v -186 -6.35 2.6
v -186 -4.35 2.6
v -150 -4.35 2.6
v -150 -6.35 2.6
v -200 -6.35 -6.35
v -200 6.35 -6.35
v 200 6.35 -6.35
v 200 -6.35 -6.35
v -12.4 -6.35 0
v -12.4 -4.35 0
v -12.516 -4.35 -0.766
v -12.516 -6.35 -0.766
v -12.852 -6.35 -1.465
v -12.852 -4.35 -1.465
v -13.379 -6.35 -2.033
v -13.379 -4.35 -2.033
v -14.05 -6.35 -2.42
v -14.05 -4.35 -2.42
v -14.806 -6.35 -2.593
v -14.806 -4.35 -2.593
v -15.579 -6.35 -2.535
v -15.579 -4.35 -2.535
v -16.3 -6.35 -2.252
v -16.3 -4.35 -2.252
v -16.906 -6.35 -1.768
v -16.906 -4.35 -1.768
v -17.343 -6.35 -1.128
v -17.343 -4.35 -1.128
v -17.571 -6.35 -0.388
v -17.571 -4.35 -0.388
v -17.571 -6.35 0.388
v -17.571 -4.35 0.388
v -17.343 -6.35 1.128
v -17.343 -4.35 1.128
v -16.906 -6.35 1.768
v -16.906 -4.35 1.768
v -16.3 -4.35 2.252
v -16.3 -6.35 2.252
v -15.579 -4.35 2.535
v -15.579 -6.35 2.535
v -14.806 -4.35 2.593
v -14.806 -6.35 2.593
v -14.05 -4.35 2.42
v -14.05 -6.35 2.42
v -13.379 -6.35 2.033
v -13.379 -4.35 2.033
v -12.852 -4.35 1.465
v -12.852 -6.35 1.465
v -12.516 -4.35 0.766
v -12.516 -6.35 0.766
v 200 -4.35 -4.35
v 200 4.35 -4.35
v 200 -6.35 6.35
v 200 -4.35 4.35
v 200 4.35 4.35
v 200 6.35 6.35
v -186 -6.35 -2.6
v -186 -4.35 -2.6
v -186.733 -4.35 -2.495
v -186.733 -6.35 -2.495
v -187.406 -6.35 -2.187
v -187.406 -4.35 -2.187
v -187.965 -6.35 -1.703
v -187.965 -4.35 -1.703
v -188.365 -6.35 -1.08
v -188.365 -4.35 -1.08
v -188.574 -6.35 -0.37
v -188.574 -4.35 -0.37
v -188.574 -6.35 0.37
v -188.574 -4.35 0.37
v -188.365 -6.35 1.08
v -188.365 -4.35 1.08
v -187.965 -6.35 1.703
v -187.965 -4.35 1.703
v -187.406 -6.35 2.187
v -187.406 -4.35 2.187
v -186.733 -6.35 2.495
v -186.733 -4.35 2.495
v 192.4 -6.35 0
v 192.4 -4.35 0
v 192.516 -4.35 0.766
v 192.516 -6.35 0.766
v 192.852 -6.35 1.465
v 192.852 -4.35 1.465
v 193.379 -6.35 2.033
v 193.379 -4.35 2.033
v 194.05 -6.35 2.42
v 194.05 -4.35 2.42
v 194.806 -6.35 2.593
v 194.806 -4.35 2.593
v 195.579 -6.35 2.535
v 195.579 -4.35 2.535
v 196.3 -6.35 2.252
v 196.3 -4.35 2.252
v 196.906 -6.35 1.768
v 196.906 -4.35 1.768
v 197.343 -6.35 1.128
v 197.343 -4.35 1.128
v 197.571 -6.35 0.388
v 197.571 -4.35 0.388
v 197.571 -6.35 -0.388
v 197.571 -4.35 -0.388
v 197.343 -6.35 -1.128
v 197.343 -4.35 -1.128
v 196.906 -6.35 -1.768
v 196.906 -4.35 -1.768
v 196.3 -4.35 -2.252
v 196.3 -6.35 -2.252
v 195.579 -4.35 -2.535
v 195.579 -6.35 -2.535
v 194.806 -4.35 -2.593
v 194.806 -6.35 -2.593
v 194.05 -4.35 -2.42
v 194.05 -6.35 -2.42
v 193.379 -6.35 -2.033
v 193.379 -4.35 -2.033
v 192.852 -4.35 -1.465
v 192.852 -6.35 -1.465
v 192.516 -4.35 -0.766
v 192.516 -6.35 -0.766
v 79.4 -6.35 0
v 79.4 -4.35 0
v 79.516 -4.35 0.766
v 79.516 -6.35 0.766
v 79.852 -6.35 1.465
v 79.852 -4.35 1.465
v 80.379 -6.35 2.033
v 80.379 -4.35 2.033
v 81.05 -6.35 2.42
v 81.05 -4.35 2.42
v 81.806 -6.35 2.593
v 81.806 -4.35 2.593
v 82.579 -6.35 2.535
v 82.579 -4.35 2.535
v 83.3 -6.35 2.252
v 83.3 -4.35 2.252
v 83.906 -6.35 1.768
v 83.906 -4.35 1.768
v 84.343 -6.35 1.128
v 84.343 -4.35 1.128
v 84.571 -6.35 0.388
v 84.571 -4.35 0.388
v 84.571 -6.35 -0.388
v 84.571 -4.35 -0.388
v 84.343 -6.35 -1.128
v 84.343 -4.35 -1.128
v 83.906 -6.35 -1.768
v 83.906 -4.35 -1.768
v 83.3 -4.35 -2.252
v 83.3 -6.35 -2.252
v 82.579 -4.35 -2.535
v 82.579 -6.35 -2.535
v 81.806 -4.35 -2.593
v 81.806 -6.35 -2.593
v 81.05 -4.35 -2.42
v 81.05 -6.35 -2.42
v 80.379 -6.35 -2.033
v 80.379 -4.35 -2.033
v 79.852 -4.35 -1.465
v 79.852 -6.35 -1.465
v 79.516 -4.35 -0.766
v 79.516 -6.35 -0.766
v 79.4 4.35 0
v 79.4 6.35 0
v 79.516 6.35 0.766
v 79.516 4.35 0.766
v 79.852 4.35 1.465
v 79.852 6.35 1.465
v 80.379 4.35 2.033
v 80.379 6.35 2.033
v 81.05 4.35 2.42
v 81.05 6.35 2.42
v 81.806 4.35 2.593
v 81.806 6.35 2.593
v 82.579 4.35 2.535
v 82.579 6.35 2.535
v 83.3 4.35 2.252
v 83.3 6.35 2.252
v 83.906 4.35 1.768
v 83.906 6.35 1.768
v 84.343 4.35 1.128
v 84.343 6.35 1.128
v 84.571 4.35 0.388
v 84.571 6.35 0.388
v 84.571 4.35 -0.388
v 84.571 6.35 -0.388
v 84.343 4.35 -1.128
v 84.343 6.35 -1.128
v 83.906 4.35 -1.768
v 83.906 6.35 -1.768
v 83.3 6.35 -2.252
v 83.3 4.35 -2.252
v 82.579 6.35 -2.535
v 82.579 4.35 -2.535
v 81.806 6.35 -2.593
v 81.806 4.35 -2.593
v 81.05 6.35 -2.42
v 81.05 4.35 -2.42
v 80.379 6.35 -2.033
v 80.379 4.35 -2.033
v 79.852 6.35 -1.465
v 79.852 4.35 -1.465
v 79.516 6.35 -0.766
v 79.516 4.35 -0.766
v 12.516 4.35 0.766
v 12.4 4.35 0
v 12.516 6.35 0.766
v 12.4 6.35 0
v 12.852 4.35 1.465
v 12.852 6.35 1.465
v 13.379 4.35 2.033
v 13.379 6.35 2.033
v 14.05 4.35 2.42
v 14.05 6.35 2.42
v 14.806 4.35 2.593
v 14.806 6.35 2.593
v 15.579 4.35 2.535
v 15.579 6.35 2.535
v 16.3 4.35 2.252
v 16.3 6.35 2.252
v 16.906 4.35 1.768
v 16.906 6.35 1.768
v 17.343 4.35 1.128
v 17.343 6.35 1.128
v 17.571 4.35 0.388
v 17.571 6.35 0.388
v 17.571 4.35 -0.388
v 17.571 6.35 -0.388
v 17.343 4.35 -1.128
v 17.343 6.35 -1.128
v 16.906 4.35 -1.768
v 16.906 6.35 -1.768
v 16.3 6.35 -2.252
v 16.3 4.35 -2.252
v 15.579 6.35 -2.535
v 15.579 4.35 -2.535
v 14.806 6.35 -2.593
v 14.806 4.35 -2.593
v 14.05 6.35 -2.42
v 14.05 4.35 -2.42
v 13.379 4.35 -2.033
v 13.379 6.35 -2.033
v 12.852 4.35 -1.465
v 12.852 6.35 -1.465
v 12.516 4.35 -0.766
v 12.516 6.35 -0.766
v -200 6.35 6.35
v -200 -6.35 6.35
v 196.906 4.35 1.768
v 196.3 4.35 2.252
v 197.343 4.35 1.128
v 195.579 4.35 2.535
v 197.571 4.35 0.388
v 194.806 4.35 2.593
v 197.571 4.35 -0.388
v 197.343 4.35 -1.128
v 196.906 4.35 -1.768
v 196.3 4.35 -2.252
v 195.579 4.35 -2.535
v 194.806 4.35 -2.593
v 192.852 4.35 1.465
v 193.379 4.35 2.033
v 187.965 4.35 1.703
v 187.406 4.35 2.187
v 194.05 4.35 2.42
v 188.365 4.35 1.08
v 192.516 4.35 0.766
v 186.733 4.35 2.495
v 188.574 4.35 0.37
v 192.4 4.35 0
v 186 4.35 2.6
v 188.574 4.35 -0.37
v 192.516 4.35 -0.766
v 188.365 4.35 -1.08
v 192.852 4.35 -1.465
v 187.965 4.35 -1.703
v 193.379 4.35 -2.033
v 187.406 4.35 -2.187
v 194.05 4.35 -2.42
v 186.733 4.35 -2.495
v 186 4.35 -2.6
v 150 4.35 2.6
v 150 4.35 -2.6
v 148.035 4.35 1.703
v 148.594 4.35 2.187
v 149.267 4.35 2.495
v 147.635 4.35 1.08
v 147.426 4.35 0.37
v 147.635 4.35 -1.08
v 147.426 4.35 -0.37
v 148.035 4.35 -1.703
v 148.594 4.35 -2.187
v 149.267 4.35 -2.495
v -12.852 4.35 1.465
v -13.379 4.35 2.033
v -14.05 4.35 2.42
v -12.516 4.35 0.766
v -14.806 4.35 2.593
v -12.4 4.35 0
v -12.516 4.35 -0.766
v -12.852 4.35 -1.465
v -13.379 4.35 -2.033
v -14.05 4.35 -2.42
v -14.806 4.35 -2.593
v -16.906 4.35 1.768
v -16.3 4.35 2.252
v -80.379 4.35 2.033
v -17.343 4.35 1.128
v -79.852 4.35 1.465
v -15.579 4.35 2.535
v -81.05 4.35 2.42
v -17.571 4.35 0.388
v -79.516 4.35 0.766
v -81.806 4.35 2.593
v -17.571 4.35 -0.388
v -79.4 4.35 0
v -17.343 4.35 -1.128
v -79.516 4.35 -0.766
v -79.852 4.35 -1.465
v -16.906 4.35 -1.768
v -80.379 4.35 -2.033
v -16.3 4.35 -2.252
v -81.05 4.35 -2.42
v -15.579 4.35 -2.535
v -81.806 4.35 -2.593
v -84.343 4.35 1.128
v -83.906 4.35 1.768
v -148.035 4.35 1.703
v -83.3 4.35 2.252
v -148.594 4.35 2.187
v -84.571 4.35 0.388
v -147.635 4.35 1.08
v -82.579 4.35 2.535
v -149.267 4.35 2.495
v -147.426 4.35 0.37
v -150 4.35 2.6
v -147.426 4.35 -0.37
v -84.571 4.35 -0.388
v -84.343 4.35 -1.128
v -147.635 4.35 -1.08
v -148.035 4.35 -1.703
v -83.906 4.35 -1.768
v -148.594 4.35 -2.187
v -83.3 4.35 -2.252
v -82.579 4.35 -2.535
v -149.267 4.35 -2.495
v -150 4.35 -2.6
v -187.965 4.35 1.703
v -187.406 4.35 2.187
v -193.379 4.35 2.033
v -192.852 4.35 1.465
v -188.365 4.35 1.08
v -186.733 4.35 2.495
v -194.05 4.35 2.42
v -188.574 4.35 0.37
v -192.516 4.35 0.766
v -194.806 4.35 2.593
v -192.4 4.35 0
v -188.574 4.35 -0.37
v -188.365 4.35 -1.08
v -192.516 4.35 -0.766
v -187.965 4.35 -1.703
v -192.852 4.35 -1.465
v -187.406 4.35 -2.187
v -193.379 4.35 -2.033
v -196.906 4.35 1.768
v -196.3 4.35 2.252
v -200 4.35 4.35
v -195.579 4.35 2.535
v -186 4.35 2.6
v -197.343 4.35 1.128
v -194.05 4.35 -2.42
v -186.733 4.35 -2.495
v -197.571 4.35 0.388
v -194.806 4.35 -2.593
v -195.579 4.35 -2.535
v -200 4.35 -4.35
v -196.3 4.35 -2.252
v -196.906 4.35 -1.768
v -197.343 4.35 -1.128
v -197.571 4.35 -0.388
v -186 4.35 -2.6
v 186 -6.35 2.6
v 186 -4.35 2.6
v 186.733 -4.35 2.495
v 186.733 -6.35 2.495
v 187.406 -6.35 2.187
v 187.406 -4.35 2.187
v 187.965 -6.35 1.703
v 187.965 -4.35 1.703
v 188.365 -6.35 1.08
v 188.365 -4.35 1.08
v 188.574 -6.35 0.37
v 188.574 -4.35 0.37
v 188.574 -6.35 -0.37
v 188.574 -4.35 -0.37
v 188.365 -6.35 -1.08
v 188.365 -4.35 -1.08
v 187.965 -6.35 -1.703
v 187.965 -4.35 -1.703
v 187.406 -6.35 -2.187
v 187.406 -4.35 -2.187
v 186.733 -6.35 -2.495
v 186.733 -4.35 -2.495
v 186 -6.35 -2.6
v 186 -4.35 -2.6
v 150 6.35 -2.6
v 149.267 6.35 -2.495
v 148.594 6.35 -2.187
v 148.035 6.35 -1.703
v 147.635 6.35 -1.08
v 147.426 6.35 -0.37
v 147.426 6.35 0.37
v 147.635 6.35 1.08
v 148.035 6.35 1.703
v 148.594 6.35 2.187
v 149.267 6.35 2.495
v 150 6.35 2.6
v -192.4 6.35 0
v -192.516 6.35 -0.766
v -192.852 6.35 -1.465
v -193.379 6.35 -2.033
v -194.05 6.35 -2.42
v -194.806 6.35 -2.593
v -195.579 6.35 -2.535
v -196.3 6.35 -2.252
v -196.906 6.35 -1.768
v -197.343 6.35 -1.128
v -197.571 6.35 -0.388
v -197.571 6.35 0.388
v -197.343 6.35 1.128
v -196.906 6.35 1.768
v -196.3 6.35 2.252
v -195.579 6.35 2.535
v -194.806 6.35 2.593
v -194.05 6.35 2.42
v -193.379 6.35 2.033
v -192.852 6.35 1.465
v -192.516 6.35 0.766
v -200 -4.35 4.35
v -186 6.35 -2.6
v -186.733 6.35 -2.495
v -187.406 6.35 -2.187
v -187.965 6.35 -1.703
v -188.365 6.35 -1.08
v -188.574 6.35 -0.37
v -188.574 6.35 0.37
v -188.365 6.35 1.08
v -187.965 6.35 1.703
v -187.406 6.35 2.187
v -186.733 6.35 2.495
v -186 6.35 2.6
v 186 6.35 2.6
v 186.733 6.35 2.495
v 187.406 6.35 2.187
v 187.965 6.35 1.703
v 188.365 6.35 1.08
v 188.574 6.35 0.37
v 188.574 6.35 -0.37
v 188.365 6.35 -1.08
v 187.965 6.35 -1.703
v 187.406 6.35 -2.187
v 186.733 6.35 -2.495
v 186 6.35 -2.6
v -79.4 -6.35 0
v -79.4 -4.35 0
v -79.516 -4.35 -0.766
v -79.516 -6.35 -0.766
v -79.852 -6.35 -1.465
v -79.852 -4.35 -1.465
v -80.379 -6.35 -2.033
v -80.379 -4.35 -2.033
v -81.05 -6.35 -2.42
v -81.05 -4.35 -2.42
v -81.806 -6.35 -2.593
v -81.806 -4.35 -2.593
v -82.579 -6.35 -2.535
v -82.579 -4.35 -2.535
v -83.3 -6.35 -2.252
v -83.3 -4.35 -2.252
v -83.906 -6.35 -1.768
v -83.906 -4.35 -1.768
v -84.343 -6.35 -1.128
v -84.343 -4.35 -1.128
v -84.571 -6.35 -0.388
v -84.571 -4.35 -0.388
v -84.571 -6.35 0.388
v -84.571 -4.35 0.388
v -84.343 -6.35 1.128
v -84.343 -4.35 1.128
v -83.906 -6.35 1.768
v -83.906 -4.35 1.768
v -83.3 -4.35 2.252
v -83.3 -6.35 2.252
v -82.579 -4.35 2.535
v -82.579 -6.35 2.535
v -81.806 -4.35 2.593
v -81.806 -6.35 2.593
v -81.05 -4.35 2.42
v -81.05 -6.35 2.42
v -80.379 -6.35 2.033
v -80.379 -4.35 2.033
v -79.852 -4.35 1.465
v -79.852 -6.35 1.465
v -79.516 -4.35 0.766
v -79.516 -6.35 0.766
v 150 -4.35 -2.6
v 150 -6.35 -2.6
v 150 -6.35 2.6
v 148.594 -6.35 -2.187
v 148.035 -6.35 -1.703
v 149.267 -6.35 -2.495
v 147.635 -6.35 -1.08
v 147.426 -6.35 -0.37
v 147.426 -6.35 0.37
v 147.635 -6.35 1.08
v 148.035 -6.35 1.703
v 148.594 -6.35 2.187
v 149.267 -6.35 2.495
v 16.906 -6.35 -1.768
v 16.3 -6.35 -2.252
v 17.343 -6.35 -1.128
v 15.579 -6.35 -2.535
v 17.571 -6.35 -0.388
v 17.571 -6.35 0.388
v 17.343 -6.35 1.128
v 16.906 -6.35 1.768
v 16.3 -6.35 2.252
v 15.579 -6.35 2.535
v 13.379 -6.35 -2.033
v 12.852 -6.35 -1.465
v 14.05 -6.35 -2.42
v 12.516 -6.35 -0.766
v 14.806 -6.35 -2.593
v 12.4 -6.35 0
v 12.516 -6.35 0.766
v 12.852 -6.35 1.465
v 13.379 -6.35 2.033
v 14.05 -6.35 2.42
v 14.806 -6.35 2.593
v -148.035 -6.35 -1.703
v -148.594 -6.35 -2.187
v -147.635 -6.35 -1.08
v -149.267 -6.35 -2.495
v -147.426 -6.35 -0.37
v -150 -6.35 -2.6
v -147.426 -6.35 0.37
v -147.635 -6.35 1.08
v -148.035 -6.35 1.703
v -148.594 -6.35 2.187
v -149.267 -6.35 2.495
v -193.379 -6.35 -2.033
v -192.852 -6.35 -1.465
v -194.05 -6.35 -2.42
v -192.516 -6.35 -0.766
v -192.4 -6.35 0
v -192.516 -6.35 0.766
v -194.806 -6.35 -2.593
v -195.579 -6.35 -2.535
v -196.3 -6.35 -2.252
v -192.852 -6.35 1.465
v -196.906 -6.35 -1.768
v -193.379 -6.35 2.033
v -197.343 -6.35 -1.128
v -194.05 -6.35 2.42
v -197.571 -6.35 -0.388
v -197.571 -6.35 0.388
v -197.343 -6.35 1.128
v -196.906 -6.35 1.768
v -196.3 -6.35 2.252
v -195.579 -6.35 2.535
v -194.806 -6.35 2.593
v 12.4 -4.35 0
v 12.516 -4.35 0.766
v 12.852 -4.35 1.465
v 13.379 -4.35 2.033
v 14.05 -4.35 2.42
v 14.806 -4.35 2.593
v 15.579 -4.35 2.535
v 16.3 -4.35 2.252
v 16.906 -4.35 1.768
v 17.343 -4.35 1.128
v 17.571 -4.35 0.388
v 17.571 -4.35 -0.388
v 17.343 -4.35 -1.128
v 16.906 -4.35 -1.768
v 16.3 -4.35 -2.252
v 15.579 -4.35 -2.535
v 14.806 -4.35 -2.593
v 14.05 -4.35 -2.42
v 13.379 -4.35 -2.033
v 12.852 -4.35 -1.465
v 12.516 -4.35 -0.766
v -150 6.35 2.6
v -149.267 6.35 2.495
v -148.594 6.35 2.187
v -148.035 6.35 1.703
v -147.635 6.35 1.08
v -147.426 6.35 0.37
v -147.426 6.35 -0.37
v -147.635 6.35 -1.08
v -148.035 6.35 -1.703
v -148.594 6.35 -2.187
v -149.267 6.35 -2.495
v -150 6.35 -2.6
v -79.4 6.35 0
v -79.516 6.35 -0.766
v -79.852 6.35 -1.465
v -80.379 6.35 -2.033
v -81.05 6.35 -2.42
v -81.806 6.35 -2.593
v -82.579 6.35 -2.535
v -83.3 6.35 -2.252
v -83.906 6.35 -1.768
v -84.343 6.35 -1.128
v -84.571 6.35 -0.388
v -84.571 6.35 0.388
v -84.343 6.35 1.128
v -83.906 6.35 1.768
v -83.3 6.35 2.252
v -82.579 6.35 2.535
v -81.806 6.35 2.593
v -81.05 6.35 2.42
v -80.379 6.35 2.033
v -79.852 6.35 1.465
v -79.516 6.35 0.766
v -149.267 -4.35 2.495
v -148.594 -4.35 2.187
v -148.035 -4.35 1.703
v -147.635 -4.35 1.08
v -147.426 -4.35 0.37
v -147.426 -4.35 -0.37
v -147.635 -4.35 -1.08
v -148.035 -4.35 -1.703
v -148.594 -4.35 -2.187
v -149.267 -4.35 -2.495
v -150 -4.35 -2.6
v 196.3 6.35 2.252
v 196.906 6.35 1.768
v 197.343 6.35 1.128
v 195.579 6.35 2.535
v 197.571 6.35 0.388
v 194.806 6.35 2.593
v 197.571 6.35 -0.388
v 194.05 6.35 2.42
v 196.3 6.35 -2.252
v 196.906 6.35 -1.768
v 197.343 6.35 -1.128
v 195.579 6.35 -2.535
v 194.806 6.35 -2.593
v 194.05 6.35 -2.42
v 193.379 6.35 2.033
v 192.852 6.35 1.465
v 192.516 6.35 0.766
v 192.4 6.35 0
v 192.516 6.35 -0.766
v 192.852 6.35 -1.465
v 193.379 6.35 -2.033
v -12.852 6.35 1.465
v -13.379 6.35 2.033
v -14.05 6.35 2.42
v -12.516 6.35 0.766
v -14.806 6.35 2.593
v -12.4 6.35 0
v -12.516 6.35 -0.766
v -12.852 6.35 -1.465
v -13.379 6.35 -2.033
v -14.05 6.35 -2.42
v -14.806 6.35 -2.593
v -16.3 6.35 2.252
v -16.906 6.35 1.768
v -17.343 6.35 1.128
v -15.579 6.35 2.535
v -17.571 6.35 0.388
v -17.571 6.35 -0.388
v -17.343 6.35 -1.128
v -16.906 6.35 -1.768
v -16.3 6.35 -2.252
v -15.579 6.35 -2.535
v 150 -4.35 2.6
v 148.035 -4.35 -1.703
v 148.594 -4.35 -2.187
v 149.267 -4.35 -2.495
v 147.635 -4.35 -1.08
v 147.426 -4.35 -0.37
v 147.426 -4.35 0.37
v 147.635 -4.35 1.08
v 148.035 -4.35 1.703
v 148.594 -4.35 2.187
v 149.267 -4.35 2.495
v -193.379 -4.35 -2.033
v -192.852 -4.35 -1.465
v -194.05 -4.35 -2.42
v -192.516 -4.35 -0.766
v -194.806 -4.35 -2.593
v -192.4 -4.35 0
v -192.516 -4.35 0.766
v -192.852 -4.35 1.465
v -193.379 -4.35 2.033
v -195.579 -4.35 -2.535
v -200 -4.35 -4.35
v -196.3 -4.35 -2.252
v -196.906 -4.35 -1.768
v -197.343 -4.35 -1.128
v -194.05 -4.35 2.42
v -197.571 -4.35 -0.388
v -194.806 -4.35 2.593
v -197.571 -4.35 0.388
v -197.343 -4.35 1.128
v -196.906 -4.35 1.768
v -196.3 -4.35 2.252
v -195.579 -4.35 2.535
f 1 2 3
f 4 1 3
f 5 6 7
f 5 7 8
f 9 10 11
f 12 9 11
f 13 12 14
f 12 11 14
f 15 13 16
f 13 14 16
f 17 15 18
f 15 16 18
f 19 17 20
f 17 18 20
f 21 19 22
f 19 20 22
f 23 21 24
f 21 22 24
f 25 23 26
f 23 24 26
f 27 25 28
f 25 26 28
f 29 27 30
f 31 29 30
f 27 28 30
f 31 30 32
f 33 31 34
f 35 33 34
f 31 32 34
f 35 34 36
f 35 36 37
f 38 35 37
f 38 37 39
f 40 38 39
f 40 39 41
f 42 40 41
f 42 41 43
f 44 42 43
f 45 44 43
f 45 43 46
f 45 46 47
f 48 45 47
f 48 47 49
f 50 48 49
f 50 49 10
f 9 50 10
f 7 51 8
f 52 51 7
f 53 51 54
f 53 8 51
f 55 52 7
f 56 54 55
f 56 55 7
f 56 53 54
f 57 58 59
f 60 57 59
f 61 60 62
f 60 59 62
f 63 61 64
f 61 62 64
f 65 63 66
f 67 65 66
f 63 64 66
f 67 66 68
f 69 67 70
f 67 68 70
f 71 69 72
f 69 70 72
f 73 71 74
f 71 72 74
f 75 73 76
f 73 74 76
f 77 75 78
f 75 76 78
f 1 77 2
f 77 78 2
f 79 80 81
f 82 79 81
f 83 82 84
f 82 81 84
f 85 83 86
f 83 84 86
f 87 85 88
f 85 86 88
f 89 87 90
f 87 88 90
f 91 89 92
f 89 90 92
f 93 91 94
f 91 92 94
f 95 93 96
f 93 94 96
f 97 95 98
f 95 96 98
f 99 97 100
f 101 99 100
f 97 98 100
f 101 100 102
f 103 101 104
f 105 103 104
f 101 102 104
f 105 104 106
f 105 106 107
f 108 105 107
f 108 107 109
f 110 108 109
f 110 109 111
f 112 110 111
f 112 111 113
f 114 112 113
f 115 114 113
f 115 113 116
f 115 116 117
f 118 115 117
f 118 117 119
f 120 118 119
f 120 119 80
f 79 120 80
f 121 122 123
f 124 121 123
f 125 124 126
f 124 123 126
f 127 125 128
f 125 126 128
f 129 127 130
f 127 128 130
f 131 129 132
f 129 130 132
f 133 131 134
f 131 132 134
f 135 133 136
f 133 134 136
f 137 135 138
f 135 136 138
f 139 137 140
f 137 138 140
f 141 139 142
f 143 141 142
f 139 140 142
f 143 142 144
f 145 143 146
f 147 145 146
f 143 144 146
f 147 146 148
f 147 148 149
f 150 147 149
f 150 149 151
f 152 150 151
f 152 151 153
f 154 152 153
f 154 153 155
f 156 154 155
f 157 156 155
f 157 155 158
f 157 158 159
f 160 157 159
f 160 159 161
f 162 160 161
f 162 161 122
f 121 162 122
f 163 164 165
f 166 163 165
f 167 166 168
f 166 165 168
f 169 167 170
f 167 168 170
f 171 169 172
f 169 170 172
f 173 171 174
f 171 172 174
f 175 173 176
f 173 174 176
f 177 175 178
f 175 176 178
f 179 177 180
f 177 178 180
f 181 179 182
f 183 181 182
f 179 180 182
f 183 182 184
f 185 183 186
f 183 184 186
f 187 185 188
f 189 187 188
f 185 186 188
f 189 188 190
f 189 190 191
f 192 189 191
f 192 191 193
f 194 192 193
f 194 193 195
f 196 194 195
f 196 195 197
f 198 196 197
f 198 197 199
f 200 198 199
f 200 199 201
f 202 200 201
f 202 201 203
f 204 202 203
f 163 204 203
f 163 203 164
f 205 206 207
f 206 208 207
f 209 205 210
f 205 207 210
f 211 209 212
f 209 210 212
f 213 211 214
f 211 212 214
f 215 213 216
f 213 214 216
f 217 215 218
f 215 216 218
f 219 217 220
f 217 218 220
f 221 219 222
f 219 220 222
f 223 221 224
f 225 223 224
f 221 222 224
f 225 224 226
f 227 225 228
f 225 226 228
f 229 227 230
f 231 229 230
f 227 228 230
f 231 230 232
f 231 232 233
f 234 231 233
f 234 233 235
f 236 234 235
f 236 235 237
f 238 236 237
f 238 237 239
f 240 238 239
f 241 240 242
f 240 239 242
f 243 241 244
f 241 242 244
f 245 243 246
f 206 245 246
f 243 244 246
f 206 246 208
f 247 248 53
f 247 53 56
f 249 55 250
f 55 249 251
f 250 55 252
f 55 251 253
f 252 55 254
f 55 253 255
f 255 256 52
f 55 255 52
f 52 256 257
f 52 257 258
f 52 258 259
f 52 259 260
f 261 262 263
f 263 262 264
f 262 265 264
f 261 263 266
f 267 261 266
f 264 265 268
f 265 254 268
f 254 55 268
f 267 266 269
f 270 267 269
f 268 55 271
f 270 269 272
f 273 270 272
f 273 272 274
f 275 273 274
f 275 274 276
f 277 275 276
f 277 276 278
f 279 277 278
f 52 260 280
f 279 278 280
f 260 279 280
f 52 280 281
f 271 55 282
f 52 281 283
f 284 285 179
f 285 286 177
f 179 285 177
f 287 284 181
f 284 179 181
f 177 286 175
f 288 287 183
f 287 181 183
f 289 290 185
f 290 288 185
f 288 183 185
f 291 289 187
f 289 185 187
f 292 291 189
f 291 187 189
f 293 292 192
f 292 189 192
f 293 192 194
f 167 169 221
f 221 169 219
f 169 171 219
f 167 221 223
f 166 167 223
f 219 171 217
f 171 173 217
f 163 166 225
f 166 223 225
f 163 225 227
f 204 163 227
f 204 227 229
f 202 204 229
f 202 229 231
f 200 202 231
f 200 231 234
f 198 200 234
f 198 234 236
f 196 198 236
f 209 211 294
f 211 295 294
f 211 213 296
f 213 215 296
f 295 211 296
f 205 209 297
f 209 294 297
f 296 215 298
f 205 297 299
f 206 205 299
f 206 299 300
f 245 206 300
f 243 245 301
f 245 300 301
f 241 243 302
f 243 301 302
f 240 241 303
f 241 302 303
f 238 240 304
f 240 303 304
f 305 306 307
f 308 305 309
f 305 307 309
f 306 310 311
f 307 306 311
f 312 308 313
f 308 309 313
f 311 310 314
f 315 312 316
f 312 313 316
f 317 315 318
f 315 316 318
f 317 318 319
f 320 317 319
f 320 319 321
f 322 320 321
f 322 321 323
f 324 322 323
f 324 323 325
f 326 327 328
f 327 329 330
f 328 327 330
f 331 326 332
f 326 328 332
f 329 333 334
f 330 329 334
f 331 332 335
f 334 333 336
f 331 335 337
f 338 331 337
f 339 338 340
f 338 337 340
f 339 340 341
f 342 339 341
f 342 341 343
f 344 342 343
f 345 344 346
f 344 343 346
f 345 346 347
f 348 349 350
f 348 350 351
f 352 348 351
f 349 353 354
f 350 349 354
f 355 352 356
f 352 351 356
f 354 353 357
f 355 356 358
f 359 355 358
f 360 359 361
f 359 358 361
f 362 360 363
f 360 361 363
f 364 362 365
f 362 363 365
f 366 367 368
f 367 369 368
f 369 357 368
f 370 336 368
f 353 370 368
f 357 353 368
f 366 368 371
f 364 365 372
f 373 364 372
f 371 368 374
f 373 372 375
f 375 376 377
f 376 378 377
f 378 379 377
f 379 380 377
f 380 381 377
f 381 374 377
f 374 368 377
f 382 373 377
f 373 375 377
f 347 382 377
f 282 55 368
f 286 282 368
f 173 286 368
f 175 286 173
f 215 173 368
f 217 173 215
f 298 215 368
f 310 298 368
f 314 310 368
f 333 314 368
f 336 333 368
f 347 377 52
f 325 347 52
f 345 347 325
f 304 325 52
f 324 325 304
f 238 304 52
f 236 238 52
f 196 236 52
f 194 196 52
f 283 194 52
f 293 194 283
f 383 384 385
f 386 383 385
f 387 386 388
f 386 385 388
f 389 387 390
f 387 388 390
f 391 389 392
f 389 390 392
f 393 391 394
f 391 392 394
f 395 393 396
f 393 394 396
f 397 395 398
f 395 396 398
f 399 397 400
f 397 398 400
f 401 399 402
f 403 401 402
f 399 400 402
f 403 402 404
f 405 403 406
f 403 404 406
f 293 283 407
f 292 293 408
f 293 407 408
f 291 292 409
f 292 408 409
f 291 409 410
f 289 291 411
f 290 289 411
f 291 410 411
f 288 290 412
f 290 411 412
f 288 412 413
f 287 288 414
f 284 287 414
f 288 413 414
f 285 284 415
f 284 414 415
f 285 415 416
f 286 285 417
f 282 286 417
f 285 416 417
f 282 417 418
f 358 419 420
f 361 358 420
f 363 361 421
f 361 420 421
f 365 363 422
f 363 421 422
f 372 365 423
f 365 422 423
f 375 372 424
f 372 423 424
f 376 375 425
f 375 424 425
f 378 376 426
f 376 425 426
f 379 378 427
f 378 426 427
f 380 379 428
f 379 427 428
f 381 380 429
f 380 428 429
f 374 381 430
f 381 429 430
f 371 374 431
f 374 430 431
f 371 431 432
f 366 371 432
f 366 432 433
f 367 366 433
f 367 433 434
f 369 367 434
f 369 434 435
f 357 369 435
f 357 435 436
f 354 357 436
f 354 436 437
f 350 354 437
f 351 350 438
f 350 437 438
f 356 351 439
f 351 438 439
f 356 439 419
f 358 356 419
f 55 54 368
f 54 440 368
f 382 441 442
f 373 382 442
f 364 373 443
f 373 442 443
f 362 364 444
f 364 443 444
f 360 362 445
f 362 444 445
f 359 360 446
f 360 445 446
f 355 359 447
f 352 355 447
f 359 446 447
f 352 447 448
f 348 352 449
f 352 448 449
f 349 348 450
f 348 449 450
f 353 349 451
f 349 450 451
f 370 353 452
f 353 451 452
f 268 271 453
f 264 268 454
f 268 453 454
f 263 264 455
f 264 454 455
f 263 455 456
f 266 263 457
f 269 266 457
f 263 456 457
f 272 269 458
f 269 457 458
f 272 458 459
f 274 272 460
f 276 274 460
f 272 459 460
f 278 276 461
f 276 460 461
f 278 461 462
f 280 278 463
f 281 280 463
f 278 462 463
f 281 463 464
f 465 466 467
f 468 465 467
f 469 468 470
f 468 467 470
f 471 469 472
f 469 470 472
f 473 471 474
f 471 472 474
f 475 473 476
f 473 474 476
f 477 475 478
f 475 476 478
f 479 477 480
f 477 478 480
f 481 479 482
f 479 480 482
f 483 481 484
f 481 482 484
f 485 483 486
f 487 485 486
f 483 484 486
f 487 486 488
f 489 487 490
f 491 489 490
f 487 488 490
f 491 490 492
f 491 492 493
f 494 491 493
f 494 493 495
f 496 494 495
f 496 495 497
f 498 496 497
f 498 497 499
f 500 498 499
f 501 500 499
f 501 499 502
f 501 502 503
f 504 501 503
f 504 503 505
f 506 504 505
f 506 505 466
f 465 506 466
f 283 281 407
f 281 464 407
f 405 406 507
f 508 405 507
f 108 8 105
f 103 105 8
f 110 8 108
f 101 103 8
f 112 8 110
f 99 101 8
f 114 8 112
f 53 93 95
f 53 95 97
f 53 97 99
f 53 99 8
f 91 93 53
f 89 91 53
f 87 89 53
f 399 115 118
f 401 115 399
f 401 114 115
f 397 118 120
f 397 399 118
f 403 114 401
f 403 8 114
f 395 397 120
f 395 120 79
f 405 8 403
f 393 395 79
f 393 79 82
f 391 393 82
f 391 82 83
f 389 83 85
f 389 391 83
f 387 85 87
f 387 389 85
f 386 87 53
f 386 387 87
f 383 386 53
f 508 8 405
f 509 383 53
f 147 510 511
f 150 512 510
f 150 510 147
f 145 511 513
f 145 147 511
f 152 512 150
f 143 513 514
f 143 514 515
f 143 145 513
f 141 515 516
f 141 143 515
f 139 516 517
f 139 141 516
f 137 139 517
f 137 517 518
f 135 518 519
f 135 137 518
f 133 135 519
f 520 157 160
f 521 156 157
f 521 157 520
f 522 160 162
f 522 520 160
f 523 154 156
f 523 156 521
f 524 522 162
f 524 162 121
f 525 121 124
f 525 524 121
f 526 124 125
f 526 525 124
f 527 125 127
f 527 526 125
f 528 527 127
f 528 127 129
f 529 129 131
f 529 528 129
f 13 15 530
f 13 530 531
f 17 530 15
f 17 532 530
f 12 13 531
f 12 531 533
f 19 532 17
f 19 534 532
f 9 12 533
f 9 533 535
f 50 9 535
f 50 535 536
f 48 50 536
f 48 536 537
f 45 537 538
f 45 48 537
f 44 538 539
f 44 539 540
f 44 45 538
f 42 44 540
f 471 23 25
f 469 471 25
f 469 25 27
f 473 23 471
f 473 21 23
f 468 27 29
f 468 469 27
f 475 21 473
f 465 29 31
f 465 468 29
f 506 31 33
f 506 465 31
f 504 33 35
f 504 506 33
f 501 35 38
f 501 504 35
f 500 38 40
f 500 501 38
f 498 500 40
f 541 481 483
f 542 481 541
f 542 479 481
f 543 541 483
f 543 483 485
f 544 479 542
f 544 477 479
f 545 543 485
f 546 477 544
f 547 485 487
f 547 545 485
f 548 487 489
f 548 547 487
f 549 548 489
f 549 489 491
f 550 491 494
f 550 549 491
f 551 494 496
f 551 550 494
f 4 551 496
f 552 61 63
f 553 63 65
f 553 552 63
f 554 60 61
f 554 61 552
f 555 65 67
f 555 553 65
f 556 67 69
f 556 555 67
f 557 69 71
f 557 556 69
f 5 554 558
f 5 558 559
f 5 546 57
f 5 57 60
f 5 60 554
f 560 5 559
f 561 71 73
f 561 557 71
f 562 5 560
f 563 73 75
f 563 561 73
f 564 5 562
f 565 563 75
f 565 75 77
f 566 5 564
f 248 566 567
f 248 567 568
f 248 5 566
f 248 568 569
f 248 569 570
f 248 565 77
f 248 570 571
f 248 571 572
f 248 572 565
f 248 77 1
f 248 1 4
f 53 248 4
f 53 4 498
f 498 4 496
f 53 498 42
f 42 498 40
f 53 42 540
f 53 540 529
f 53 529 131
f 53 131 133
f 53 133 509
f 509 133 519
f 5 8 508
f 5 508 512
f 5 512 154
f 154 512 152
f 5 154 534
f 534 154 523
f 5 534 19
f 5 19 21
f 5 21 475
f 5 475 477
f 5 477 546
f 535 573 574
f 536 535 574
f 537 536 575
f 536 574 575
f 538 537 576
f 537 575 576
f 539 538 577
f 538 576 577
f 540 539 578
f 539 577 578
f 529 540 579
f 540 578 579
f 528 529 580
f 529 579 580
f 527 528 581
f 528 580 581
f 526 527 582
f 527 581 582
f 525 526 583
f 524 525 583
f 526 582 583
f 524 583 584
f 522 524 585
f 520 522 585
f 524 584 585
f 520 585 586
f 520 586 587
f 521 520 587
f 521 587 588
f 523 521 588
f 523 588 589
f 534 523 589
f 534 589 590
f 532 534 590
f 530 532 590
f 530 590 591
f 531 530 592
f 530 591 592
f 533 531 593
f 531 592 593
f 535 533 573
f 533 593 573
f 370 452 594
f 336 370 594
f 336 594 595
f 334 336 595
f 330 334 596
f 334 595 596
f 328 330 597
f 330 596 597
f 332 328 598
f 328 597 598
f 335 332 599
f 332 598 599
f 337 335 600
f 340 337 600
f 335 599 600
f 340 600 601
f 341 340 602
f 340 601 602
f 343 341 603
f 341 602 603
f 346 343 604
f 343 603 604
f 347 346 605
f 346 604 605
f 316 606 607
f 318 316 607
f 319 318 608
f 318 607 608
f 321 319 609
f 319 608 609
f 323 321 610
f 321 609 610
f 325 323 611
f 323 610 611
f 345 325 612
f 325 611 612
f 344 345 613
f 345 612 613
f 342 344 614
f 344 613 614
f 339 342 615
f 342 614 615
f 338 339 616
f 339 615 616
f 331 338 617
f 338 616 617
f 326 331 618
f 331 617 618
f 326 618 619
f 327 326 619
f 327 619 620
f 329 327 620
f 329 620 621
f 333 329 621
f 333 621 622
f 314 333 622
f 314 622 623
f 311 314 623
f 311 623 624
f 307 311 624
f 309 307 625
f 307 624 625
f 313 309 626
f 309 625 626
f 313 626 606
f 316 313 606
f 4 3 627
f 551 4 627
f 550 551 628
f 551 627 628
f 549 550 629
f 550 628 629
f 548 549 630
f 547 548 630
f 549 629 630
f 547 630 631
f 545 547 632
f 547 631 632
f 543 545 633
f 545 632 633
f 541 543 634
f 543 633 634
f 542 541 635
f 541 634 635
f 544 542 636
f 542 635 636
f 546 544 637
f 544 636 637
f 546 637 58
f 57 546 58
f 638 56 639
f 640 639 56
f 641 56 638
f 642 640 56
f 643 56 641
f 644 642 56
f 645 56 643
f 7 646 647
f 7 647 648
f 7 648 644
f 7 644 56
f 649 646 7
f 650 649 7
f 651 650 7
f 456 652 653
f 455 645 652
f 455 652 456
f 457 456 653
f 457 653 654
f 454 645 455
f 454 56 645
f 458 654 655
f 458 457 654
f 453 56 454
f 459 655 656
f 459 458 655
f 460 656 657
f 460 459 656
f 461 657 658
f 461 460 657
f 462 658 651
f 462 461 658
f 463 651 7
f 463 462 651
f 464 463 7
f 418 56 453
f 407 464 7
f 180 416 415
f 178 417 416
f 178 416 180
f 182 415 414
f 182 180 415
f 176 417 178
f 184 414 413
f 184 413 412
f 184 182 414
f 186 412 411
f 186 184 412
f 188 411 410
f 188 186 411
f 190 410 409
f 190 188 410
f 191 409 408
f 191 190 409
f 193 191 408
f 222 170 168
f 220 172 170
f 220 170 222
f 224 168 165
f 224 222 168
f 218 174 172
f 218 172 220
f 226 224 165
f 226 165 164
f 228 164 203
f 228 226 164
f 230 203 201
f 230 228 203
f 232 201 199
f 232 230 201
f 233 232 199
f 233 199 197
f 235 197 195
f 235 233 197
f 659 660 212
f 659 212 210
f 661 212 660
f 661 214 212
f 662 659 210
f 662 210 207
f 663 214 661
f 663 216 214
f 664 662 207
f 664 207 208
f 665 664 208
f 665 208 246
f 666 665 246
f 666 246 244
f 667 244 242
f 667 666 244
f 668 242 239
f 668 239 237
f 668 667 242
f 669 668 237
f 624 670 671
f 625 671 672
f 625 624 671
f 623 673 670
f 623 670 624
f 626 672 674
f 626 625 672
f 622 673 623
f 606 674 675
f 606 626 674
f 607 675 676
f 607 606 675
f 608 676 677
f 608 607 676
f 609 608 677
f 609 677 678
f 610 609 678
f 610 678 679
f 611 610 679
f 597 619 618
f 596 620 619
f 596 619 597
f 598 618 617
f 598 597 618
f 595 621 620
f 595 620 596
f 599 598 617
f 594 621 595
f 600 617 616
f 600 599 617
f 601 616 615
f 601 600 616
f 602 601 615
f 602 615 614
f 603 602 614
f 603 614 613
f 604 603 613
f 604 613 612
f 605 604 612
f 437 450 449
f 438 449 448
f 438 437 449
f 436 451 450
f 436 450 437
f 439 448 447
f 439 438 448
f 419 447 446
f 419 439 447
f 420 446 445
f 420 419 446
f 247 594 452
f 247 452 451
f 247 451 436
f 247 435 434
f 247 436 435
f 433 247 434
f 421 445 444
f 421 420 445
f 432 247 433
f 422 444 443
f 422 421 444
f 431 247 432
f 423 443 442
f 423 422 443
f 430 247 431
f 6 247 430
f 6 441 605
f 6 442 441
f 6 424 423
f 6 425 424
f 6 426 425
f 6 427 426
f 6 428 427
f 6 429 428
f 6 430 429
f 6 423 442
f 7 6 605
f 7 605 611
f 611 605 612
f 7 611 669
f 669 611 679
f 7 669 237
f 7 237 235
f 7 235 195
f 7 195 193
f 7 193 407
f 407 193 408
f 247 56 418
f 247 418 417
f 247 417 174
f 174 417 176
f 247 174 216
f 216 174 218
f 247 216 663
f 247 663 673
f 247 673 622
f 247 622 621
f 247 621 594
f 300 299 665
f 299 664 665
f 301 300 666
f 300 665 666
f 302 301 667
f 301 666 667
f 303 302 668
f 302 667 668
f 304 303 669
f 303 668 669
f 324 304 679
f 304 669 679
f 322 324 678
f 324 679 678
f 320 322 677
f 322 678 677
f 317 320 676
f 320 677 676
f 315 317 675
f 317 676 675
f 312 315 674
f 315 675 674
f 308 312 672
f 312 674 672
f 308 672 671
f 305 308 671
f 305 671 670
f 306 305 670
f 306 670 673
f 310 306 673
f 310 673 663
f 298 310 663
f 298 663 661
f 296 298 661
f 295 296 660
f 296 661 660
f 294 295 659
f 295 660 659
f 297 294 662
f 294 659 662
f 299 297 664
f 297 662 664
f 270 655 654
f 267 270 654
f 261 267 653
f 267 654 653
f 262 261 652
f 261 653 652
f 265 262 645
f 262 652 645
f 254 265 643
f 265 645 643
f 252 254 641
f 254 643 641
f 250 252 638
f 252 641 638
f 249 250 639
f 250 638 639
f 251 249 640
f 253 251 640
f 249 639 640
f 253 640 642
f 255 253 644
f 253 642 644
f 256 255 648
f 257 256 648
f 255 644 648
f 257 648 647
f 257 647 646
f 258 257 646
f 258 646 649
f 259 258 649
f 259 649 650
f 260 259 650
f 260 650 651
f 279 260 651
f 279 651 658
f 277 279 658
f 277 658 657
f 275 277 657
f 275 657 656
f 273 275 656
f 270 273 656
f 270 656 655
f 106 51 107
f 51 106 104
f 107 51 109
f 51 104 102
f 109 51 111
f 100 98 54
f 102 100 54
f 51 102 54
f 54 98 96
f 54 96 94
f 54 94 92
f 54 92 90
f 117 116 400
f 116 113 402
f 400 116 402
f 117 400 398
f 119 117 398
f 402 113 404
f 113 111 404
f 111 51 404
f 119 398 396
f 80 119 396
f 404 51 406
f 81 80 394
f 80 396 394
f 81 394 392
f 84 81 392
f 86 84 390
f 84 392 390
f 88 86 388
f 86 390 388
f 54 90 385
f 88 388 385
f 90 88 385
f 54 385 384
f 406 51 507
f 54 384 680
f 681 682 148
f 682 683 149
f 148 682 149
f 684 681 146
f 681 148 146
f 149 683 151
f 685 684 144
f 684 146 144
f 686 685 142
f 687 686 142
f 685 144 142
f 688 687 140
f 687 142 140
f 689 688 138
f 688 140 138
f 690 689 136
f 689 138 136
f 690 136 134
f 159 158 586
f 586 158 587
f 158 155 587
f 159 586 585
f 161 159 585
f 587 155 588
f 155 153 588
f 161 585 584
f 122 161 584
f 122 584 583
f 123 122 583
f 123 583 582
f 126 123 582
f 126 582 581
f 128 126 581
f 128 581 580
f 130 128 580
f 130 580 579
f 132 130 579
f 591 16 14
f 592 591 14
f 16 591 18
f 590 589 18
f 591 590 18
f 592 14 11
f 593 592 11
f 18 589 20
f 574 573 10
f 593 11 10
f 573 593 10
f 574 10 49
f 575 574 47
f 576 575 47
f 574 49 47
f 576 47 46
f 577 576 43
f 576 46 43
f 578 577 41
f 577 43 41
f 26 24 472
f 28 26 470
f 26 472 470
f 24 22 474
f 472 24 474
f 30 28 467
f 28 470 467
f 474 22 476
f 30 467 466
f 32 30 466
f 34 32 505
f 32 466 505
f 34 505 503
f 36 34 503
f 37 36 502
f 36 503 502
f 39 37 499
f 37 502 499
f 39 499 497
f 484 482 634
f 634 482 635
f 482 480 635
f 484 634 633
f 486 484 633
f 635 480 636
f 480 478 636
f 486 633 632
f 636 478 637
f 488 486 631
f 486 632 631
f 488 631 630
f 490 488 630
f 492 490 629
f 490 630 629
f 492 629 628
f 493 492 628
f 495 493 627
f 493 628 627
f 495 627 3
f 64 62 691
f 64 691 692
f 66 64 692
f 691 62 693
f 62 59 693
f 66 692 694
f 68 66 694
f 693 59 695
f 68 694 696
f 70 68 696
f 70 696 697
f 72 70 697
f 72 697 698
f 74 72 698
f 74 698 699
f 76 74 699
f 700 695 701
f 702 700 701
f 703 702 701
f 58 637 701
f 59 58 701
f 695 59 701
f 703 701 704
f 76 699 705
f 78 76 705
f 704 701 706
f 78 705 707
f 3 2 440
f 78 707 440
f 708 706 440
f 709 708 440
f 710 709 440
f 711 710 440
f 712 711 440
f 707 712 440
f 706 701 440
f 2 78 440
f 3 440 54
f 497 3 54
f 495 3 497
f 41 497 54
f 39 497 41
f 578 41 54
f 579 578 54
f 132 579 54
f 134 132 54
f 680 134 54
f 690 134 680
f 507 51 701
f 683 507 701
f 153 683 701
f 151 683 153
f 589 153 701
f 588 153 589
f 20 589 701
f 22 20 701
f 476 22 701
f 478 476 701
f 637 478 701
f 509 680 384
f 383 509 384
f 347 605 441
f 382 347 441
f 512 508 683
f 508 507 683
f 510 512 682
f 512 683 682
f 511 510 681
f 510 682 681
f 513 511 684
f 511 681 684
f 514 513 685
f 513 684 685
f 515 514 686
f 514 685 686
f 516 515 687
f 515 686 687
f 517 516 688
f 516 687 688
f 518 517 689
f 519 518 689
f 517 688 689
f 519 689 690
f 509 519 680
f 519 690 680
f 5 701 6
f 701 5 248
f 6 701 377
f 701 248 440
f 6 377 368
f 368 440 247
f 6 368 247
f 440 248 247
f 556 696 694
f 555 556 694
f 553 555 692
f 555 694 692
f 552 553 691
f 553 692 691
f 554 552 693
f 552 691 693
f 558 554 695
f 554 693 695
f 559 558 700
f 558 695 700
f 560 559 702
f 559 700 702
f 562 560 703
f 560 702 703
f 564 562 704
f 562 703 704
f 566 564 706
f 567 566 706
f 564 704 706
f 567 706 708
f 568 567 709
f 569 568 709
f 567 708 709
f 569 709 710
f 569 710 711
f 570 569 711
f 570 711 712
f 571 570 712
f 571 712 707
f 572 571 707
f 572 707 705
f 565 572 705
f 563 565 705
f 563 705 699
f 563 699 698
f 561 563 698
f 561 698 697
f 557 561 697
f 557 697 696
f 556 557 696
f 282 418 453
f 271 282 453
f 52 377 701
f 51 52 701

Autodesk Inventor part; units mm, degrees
ref_plane "YZ Plane" through (0, 0, 0) normal (1, 0, 0) x (0, 1, 0)
ref_plane "XZ Plane" through (0, 0, 0) normal (0, 1, 0) x (-1, 0, 0)
ref_plane "XY Plane" through (0, 0, 0) normal (0, 0, 1) x (1, 0, 0)
sketch "Sketch1" plane through (0, 0, 0) normal (1, 0, 0) x (0, 1, 0)
  line L0 (-6.35, 6.35) -> (6.35, 6.35)
  line L1 (6.35, 6.35) -> (6.35, -6.35)
  line L2 (6.35, -6.35) -> (-6.35, -6.35)
  line L3 (-6.35, -6.35) -> (-6.35, 6.35)
  line L4 (-6.35, 6.35) -> (6.35, -6.35) construction
  line L5 (6.35, 6.35) -> (-6.35, -6.35) construction
  line L6 (-4.35, 4.35) -> (4.35, 4.35)
  line L7 (4.35, 4.35) -> (4.35, -4.35)
  line L8 (4.35, -4.35) -> (-4.35, -4.35)
  line L9 (-4.35, -4.35) -> (-4.35, 4.35)
  line L10 (-4.35, 4.35) -> (4.35, -4.35) construction
  line L11 (4.35, 4.35) -> (-4.35, -4.35) construction
  point P0 (0, 0)
  dimension "d0" = 12.7
  dimension "d1" = 12.7
  dimension "d15" = 2
  dimension "d16" = 2
extrude "Extrusion1" add sketch "Sketch1" along normal mid plane 400
sketch "Sketch2" plane through (-200, 6.35, 6.35) normal (0, 1, 0) x (1, 0, 0)
  circle A0 centre (5, 6.35) radius 2.6
  line L0 (14, 6.35) -> (50, 6.35) construction
  line L1 (14, 3.75) -> (50, 3.75)
  line L2 (50, 8.95) -> (14, 8.95)
  arc A1 (14, 8.95) -> (14, 3.75) centre (14, 6.35) ccw
  arc A2 (50, 3.75) -> (50, 8.95) centre (50, 6.35) ccw
  line L3 (0, 0) -> (0, 12.7) projected
  circle A3 centre (118, 6.35) radius 2.6
  circle A4 centre (185, 6.35) radius 2.6
  point P0 (200, 6.35)
  point P1 (32, 6.35)
  dimension "d6" = 5.2
  dimension "d7" = 5
  dimension "d8" = 9
  dimension "d9" = 36
  dimension "d13" = 67
  dimension "d14" = 15
extrude "Extrusion2" cut sketch "Sketch2" against normal blind 100
mirror "Mirror1" about plane through (0, 0, 0) normal (1, 0, 0) of "Extrusion2"
properties part number "holder_bar"
